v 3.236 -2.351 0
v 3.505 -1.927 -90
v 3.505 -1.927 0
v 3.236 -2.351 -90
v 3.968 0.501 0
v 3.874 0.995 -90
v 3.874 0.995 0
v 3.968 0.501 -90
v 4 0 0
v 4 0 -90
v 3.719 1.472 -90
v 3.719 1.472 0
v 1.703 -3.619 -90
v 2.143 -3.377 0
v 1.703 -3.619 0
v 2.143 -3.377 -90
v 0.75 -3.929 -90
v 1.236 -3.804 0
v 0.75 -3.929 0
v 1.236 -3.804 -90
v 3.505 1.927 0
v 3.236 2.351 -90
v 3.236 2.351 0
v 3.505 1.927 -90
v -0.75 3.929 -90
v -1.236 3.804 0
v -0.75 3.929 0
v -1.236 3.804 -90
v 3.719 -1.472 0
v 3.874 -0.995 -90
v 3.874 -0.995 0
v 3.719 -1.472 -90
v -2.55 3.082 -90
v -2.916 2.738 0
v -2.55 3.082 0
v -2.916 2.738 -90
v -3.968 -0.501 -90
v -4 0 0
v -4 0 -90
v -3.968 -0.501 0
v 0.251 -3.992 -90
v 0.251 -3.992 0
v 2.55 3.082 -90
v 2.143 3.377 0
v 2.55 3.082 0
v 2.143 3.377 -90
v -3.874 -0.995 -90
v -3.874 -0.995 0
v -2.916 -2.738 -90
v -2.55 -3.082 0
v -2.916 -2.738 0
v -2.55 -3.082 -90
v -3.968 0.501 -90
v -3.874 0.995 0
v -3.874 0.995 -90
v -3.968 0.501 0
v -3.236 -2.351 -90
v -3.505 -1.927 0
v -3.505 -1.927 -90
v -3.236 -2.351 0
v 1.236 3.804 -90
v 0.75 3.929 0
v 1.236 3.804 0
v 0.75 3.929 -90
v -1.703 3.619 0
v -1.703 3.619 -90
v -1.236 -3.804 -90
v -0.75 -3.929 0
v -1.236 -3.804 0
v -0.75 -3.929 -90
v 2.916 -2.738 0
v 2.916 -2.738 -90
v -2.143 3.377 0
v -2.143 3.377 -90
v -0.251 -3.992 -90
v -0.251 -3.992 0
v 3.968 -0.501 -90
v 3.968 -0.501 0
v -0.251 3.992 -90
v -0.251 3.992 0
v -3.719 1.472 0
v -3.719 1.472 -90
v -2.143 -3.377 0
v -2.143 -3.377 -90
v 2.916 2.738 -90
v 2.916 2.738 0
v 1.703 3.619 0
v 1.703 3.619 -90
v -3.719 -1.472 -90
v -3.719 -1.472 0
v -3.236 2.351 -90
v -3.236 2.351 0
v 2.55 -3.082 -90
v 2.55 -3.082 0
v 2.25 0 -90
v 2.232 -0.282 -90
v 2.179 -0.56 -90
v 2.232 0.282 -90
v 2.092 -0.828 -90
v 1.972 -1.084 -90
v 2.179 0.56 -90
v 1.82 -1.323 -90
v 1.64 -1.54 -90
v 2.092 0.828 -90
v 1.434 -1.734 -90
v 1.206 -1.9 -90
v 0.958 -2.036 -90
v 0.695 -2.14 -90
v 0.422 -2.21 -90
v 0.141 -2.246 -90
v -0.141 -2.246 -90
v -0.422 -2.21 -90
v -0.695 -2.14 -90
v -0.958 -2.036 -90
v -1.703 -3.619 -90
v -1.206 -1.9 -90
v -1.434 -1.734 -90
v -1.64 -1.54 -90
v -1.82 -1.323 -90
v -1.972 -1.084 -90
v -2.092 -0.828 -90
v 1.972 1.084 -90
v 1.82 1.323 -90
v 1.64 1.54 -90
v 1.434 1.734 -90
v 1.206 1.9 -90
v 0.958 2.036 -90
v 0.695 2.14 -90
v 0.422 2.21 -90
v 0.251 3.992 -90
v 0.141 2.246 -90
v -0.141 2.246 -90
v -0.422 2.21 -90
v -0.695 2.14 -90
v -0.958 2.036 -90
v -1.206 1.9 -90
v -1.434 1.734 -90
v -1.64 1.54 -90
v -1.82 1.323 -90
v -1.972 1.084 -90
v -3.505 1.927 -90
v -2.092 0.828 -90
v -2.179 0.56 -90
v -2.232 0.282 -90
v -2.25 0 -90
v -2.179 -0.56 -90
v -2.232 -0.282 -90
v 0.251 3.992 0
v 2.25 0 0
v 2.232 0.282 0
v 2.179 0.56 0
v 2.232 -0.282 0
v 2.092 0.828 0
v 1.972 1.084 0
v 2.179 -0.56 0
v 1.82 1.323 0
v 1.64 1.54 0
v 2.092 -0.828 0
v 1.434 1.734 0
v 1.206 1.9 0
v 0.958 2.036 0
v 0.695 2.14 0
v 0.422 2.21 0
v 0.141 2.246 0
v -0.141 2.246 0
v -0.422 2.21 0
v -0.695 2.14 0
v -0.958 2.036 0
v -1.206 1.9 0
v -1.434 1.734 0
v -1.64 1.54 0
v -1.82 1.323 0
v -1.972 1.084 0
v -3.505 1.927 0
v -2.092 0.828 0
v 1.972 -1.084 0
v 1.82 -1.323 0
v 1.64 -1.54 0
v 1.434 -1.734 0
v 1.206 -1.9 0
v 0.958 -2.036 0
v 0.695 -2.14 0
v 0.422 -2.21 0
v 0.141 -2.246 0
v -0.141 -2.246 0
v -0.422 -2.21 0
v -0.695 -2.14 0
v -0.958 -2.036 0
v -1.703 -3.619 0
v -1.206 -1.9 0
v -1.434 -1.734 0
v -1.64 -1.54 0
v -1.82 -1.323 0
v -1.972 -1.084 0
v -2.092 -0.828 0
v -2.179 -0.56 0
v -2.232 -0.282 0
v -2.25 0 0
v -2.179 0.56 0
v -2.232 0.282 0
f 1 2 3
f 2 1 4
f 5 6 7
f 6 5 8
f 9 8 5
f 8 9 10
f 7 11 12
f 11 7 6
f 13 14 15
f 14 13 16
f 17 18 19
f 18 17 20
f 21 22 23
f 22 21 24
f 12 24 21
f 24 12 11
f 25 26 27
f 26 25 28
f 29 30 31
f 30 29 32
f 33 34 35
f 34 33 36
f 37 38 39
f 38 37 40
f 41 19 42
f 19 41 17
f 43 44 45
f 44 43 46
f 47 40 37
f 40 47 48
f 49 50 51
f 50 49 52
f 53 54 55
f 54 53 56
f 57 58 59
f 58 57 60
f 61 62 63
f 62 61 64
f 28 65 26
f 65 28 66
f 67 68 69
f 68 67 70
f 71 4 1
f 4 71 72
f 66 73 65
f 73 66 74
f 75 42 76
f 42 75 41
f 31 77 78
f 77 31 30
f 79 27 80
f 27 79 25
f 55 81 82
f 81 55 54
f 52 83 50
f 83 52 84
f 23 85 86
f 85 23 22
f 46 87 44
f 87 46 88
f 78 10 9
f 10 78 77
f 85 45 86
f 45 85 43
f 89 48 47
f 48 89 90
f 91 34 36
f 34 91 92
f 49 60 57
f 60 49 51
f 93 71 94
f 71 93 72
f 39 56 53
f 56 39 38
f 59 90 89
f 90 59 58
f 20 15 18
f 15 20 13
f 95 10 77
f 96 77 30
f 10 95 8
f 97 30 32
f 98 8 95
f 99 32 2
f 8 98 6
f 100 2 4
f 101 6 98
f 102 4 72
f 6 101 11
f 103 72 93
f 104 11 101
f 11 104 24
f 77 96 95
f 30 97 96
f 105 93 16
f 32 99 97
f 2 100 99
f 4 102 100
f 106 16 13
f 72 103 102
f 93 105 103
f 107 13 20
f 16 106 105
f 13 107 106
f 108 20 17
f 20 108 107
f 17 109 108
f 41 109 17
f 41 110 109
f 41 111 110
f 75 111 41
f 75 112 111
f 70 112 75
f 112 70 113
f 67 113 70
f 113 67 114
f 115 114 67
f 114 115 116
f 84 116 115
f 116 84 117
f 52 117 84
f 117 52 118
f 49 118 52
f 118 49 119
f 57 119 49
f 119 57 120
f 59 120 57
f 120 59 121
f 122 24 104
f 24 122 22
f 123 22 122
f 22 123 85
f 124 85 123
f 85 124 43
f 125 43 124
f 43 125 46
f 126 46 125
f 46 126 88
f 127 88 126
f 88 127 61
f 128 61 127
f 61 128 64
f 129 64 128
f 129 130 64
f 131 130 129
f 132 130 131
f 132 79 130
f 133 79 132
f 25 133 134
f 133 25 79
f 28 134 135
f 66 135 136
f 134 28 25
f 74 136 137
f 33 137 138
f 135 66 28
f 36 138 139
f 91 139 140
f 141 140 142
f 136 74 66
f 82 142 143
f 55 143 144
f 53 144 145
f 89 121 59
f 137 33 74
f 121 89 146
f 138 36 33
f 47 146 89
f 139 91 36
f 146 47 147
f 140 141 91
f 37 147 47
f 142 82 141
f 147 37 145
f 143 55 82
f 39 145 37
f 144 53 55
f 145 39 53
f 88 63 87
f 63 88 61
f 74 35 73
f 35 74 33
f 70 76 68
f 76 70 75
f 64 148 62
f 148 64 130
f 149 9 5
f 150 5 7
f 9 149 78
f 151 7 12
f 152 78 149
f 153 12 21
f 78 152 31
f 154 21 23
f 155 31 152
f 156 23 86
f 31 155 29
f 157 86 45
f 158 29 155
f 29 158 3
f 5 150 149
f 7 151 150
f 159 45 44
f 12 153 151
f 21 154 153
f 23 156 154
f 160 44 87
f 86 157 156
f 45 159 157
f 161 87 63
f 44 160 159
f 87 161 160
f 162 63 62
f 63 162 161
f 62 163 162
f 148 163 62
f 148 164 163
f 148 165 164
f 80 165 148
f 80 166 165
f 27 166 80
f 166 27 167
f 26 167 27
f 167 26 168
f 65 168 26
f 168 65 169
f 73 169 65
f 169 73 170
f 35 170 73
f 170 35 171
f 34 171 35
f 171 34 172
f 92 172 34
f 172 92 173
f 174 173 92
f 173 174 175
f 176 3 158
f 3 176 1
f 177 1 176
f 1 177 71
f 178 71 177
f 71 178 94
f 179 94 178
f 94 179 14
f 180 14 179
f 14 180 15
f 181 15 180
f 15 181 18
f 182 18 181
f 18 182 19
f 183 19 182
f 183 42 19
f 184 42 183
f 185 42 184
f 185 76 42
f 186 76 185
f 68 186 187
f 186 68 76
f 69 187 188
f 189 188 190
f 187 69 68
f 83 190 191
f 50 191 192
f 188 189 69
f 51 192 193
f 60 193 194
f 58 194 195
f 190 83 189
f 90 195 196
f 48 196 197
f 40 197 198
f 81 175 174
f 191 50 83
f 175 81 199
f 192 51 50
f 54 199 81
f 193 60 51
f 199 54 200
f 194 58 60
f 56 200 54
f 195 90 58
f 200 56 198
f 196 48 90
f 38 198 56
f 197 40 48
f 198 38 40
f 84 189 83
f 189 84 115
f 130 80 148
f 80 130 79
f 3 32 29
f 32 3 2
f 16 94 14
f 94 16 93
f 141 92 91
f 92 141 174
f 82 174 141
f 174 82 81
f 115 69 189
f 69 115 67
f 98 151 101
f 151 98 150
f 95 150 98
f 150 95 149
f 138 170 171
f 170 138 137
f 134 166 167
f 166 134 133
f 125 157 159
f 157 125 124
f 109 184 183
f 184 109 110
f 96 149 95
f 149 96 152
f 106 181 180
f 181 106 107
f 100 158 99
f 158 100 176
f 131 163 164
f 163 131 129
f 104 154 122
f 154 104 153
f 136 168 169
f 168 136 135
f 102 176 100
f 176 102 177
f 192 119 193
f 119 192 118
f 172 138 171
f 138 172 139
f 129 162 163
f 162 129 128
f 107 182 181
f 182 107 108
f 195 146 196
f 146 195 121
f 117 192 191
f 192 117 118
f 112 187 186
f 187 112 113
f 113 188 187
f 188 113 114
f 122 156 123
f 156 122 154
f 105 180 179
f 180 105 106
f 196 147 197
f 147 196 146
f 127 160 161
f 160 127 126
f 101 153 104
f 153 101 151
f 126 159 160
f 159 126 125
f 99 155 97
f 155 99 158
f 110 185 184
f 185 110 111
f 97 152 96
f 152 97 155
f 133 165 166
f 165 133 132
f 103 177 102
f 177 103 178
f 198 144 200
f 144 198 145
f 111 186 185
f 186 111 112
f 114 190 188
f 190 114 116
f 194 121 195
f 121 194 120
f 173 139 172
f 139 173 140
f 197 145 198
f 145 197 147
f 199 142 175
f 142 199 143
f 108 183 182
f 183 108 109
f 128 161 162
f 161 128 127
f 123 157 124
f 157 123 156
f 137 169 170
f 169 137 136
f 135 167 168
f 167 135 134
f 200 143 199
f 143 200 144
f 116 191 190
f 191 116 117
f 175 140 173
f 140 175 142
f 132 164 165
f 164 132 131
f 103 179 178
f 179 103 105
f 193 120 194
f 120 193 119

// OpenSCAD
$fn = 50;


difference() {
	union() {
		translate(v = [0, 0, -90.0000000000]) {
			cylinder(h = 90, r = 4.0000000000);
		}
		cylinder(h = 0, r = 7.0000000000);
	}
	union() {
		#translate(v = [0, 0, -90]) {
			cylinder(h = 90, r = 2.2500000000);
		}
	}
}
